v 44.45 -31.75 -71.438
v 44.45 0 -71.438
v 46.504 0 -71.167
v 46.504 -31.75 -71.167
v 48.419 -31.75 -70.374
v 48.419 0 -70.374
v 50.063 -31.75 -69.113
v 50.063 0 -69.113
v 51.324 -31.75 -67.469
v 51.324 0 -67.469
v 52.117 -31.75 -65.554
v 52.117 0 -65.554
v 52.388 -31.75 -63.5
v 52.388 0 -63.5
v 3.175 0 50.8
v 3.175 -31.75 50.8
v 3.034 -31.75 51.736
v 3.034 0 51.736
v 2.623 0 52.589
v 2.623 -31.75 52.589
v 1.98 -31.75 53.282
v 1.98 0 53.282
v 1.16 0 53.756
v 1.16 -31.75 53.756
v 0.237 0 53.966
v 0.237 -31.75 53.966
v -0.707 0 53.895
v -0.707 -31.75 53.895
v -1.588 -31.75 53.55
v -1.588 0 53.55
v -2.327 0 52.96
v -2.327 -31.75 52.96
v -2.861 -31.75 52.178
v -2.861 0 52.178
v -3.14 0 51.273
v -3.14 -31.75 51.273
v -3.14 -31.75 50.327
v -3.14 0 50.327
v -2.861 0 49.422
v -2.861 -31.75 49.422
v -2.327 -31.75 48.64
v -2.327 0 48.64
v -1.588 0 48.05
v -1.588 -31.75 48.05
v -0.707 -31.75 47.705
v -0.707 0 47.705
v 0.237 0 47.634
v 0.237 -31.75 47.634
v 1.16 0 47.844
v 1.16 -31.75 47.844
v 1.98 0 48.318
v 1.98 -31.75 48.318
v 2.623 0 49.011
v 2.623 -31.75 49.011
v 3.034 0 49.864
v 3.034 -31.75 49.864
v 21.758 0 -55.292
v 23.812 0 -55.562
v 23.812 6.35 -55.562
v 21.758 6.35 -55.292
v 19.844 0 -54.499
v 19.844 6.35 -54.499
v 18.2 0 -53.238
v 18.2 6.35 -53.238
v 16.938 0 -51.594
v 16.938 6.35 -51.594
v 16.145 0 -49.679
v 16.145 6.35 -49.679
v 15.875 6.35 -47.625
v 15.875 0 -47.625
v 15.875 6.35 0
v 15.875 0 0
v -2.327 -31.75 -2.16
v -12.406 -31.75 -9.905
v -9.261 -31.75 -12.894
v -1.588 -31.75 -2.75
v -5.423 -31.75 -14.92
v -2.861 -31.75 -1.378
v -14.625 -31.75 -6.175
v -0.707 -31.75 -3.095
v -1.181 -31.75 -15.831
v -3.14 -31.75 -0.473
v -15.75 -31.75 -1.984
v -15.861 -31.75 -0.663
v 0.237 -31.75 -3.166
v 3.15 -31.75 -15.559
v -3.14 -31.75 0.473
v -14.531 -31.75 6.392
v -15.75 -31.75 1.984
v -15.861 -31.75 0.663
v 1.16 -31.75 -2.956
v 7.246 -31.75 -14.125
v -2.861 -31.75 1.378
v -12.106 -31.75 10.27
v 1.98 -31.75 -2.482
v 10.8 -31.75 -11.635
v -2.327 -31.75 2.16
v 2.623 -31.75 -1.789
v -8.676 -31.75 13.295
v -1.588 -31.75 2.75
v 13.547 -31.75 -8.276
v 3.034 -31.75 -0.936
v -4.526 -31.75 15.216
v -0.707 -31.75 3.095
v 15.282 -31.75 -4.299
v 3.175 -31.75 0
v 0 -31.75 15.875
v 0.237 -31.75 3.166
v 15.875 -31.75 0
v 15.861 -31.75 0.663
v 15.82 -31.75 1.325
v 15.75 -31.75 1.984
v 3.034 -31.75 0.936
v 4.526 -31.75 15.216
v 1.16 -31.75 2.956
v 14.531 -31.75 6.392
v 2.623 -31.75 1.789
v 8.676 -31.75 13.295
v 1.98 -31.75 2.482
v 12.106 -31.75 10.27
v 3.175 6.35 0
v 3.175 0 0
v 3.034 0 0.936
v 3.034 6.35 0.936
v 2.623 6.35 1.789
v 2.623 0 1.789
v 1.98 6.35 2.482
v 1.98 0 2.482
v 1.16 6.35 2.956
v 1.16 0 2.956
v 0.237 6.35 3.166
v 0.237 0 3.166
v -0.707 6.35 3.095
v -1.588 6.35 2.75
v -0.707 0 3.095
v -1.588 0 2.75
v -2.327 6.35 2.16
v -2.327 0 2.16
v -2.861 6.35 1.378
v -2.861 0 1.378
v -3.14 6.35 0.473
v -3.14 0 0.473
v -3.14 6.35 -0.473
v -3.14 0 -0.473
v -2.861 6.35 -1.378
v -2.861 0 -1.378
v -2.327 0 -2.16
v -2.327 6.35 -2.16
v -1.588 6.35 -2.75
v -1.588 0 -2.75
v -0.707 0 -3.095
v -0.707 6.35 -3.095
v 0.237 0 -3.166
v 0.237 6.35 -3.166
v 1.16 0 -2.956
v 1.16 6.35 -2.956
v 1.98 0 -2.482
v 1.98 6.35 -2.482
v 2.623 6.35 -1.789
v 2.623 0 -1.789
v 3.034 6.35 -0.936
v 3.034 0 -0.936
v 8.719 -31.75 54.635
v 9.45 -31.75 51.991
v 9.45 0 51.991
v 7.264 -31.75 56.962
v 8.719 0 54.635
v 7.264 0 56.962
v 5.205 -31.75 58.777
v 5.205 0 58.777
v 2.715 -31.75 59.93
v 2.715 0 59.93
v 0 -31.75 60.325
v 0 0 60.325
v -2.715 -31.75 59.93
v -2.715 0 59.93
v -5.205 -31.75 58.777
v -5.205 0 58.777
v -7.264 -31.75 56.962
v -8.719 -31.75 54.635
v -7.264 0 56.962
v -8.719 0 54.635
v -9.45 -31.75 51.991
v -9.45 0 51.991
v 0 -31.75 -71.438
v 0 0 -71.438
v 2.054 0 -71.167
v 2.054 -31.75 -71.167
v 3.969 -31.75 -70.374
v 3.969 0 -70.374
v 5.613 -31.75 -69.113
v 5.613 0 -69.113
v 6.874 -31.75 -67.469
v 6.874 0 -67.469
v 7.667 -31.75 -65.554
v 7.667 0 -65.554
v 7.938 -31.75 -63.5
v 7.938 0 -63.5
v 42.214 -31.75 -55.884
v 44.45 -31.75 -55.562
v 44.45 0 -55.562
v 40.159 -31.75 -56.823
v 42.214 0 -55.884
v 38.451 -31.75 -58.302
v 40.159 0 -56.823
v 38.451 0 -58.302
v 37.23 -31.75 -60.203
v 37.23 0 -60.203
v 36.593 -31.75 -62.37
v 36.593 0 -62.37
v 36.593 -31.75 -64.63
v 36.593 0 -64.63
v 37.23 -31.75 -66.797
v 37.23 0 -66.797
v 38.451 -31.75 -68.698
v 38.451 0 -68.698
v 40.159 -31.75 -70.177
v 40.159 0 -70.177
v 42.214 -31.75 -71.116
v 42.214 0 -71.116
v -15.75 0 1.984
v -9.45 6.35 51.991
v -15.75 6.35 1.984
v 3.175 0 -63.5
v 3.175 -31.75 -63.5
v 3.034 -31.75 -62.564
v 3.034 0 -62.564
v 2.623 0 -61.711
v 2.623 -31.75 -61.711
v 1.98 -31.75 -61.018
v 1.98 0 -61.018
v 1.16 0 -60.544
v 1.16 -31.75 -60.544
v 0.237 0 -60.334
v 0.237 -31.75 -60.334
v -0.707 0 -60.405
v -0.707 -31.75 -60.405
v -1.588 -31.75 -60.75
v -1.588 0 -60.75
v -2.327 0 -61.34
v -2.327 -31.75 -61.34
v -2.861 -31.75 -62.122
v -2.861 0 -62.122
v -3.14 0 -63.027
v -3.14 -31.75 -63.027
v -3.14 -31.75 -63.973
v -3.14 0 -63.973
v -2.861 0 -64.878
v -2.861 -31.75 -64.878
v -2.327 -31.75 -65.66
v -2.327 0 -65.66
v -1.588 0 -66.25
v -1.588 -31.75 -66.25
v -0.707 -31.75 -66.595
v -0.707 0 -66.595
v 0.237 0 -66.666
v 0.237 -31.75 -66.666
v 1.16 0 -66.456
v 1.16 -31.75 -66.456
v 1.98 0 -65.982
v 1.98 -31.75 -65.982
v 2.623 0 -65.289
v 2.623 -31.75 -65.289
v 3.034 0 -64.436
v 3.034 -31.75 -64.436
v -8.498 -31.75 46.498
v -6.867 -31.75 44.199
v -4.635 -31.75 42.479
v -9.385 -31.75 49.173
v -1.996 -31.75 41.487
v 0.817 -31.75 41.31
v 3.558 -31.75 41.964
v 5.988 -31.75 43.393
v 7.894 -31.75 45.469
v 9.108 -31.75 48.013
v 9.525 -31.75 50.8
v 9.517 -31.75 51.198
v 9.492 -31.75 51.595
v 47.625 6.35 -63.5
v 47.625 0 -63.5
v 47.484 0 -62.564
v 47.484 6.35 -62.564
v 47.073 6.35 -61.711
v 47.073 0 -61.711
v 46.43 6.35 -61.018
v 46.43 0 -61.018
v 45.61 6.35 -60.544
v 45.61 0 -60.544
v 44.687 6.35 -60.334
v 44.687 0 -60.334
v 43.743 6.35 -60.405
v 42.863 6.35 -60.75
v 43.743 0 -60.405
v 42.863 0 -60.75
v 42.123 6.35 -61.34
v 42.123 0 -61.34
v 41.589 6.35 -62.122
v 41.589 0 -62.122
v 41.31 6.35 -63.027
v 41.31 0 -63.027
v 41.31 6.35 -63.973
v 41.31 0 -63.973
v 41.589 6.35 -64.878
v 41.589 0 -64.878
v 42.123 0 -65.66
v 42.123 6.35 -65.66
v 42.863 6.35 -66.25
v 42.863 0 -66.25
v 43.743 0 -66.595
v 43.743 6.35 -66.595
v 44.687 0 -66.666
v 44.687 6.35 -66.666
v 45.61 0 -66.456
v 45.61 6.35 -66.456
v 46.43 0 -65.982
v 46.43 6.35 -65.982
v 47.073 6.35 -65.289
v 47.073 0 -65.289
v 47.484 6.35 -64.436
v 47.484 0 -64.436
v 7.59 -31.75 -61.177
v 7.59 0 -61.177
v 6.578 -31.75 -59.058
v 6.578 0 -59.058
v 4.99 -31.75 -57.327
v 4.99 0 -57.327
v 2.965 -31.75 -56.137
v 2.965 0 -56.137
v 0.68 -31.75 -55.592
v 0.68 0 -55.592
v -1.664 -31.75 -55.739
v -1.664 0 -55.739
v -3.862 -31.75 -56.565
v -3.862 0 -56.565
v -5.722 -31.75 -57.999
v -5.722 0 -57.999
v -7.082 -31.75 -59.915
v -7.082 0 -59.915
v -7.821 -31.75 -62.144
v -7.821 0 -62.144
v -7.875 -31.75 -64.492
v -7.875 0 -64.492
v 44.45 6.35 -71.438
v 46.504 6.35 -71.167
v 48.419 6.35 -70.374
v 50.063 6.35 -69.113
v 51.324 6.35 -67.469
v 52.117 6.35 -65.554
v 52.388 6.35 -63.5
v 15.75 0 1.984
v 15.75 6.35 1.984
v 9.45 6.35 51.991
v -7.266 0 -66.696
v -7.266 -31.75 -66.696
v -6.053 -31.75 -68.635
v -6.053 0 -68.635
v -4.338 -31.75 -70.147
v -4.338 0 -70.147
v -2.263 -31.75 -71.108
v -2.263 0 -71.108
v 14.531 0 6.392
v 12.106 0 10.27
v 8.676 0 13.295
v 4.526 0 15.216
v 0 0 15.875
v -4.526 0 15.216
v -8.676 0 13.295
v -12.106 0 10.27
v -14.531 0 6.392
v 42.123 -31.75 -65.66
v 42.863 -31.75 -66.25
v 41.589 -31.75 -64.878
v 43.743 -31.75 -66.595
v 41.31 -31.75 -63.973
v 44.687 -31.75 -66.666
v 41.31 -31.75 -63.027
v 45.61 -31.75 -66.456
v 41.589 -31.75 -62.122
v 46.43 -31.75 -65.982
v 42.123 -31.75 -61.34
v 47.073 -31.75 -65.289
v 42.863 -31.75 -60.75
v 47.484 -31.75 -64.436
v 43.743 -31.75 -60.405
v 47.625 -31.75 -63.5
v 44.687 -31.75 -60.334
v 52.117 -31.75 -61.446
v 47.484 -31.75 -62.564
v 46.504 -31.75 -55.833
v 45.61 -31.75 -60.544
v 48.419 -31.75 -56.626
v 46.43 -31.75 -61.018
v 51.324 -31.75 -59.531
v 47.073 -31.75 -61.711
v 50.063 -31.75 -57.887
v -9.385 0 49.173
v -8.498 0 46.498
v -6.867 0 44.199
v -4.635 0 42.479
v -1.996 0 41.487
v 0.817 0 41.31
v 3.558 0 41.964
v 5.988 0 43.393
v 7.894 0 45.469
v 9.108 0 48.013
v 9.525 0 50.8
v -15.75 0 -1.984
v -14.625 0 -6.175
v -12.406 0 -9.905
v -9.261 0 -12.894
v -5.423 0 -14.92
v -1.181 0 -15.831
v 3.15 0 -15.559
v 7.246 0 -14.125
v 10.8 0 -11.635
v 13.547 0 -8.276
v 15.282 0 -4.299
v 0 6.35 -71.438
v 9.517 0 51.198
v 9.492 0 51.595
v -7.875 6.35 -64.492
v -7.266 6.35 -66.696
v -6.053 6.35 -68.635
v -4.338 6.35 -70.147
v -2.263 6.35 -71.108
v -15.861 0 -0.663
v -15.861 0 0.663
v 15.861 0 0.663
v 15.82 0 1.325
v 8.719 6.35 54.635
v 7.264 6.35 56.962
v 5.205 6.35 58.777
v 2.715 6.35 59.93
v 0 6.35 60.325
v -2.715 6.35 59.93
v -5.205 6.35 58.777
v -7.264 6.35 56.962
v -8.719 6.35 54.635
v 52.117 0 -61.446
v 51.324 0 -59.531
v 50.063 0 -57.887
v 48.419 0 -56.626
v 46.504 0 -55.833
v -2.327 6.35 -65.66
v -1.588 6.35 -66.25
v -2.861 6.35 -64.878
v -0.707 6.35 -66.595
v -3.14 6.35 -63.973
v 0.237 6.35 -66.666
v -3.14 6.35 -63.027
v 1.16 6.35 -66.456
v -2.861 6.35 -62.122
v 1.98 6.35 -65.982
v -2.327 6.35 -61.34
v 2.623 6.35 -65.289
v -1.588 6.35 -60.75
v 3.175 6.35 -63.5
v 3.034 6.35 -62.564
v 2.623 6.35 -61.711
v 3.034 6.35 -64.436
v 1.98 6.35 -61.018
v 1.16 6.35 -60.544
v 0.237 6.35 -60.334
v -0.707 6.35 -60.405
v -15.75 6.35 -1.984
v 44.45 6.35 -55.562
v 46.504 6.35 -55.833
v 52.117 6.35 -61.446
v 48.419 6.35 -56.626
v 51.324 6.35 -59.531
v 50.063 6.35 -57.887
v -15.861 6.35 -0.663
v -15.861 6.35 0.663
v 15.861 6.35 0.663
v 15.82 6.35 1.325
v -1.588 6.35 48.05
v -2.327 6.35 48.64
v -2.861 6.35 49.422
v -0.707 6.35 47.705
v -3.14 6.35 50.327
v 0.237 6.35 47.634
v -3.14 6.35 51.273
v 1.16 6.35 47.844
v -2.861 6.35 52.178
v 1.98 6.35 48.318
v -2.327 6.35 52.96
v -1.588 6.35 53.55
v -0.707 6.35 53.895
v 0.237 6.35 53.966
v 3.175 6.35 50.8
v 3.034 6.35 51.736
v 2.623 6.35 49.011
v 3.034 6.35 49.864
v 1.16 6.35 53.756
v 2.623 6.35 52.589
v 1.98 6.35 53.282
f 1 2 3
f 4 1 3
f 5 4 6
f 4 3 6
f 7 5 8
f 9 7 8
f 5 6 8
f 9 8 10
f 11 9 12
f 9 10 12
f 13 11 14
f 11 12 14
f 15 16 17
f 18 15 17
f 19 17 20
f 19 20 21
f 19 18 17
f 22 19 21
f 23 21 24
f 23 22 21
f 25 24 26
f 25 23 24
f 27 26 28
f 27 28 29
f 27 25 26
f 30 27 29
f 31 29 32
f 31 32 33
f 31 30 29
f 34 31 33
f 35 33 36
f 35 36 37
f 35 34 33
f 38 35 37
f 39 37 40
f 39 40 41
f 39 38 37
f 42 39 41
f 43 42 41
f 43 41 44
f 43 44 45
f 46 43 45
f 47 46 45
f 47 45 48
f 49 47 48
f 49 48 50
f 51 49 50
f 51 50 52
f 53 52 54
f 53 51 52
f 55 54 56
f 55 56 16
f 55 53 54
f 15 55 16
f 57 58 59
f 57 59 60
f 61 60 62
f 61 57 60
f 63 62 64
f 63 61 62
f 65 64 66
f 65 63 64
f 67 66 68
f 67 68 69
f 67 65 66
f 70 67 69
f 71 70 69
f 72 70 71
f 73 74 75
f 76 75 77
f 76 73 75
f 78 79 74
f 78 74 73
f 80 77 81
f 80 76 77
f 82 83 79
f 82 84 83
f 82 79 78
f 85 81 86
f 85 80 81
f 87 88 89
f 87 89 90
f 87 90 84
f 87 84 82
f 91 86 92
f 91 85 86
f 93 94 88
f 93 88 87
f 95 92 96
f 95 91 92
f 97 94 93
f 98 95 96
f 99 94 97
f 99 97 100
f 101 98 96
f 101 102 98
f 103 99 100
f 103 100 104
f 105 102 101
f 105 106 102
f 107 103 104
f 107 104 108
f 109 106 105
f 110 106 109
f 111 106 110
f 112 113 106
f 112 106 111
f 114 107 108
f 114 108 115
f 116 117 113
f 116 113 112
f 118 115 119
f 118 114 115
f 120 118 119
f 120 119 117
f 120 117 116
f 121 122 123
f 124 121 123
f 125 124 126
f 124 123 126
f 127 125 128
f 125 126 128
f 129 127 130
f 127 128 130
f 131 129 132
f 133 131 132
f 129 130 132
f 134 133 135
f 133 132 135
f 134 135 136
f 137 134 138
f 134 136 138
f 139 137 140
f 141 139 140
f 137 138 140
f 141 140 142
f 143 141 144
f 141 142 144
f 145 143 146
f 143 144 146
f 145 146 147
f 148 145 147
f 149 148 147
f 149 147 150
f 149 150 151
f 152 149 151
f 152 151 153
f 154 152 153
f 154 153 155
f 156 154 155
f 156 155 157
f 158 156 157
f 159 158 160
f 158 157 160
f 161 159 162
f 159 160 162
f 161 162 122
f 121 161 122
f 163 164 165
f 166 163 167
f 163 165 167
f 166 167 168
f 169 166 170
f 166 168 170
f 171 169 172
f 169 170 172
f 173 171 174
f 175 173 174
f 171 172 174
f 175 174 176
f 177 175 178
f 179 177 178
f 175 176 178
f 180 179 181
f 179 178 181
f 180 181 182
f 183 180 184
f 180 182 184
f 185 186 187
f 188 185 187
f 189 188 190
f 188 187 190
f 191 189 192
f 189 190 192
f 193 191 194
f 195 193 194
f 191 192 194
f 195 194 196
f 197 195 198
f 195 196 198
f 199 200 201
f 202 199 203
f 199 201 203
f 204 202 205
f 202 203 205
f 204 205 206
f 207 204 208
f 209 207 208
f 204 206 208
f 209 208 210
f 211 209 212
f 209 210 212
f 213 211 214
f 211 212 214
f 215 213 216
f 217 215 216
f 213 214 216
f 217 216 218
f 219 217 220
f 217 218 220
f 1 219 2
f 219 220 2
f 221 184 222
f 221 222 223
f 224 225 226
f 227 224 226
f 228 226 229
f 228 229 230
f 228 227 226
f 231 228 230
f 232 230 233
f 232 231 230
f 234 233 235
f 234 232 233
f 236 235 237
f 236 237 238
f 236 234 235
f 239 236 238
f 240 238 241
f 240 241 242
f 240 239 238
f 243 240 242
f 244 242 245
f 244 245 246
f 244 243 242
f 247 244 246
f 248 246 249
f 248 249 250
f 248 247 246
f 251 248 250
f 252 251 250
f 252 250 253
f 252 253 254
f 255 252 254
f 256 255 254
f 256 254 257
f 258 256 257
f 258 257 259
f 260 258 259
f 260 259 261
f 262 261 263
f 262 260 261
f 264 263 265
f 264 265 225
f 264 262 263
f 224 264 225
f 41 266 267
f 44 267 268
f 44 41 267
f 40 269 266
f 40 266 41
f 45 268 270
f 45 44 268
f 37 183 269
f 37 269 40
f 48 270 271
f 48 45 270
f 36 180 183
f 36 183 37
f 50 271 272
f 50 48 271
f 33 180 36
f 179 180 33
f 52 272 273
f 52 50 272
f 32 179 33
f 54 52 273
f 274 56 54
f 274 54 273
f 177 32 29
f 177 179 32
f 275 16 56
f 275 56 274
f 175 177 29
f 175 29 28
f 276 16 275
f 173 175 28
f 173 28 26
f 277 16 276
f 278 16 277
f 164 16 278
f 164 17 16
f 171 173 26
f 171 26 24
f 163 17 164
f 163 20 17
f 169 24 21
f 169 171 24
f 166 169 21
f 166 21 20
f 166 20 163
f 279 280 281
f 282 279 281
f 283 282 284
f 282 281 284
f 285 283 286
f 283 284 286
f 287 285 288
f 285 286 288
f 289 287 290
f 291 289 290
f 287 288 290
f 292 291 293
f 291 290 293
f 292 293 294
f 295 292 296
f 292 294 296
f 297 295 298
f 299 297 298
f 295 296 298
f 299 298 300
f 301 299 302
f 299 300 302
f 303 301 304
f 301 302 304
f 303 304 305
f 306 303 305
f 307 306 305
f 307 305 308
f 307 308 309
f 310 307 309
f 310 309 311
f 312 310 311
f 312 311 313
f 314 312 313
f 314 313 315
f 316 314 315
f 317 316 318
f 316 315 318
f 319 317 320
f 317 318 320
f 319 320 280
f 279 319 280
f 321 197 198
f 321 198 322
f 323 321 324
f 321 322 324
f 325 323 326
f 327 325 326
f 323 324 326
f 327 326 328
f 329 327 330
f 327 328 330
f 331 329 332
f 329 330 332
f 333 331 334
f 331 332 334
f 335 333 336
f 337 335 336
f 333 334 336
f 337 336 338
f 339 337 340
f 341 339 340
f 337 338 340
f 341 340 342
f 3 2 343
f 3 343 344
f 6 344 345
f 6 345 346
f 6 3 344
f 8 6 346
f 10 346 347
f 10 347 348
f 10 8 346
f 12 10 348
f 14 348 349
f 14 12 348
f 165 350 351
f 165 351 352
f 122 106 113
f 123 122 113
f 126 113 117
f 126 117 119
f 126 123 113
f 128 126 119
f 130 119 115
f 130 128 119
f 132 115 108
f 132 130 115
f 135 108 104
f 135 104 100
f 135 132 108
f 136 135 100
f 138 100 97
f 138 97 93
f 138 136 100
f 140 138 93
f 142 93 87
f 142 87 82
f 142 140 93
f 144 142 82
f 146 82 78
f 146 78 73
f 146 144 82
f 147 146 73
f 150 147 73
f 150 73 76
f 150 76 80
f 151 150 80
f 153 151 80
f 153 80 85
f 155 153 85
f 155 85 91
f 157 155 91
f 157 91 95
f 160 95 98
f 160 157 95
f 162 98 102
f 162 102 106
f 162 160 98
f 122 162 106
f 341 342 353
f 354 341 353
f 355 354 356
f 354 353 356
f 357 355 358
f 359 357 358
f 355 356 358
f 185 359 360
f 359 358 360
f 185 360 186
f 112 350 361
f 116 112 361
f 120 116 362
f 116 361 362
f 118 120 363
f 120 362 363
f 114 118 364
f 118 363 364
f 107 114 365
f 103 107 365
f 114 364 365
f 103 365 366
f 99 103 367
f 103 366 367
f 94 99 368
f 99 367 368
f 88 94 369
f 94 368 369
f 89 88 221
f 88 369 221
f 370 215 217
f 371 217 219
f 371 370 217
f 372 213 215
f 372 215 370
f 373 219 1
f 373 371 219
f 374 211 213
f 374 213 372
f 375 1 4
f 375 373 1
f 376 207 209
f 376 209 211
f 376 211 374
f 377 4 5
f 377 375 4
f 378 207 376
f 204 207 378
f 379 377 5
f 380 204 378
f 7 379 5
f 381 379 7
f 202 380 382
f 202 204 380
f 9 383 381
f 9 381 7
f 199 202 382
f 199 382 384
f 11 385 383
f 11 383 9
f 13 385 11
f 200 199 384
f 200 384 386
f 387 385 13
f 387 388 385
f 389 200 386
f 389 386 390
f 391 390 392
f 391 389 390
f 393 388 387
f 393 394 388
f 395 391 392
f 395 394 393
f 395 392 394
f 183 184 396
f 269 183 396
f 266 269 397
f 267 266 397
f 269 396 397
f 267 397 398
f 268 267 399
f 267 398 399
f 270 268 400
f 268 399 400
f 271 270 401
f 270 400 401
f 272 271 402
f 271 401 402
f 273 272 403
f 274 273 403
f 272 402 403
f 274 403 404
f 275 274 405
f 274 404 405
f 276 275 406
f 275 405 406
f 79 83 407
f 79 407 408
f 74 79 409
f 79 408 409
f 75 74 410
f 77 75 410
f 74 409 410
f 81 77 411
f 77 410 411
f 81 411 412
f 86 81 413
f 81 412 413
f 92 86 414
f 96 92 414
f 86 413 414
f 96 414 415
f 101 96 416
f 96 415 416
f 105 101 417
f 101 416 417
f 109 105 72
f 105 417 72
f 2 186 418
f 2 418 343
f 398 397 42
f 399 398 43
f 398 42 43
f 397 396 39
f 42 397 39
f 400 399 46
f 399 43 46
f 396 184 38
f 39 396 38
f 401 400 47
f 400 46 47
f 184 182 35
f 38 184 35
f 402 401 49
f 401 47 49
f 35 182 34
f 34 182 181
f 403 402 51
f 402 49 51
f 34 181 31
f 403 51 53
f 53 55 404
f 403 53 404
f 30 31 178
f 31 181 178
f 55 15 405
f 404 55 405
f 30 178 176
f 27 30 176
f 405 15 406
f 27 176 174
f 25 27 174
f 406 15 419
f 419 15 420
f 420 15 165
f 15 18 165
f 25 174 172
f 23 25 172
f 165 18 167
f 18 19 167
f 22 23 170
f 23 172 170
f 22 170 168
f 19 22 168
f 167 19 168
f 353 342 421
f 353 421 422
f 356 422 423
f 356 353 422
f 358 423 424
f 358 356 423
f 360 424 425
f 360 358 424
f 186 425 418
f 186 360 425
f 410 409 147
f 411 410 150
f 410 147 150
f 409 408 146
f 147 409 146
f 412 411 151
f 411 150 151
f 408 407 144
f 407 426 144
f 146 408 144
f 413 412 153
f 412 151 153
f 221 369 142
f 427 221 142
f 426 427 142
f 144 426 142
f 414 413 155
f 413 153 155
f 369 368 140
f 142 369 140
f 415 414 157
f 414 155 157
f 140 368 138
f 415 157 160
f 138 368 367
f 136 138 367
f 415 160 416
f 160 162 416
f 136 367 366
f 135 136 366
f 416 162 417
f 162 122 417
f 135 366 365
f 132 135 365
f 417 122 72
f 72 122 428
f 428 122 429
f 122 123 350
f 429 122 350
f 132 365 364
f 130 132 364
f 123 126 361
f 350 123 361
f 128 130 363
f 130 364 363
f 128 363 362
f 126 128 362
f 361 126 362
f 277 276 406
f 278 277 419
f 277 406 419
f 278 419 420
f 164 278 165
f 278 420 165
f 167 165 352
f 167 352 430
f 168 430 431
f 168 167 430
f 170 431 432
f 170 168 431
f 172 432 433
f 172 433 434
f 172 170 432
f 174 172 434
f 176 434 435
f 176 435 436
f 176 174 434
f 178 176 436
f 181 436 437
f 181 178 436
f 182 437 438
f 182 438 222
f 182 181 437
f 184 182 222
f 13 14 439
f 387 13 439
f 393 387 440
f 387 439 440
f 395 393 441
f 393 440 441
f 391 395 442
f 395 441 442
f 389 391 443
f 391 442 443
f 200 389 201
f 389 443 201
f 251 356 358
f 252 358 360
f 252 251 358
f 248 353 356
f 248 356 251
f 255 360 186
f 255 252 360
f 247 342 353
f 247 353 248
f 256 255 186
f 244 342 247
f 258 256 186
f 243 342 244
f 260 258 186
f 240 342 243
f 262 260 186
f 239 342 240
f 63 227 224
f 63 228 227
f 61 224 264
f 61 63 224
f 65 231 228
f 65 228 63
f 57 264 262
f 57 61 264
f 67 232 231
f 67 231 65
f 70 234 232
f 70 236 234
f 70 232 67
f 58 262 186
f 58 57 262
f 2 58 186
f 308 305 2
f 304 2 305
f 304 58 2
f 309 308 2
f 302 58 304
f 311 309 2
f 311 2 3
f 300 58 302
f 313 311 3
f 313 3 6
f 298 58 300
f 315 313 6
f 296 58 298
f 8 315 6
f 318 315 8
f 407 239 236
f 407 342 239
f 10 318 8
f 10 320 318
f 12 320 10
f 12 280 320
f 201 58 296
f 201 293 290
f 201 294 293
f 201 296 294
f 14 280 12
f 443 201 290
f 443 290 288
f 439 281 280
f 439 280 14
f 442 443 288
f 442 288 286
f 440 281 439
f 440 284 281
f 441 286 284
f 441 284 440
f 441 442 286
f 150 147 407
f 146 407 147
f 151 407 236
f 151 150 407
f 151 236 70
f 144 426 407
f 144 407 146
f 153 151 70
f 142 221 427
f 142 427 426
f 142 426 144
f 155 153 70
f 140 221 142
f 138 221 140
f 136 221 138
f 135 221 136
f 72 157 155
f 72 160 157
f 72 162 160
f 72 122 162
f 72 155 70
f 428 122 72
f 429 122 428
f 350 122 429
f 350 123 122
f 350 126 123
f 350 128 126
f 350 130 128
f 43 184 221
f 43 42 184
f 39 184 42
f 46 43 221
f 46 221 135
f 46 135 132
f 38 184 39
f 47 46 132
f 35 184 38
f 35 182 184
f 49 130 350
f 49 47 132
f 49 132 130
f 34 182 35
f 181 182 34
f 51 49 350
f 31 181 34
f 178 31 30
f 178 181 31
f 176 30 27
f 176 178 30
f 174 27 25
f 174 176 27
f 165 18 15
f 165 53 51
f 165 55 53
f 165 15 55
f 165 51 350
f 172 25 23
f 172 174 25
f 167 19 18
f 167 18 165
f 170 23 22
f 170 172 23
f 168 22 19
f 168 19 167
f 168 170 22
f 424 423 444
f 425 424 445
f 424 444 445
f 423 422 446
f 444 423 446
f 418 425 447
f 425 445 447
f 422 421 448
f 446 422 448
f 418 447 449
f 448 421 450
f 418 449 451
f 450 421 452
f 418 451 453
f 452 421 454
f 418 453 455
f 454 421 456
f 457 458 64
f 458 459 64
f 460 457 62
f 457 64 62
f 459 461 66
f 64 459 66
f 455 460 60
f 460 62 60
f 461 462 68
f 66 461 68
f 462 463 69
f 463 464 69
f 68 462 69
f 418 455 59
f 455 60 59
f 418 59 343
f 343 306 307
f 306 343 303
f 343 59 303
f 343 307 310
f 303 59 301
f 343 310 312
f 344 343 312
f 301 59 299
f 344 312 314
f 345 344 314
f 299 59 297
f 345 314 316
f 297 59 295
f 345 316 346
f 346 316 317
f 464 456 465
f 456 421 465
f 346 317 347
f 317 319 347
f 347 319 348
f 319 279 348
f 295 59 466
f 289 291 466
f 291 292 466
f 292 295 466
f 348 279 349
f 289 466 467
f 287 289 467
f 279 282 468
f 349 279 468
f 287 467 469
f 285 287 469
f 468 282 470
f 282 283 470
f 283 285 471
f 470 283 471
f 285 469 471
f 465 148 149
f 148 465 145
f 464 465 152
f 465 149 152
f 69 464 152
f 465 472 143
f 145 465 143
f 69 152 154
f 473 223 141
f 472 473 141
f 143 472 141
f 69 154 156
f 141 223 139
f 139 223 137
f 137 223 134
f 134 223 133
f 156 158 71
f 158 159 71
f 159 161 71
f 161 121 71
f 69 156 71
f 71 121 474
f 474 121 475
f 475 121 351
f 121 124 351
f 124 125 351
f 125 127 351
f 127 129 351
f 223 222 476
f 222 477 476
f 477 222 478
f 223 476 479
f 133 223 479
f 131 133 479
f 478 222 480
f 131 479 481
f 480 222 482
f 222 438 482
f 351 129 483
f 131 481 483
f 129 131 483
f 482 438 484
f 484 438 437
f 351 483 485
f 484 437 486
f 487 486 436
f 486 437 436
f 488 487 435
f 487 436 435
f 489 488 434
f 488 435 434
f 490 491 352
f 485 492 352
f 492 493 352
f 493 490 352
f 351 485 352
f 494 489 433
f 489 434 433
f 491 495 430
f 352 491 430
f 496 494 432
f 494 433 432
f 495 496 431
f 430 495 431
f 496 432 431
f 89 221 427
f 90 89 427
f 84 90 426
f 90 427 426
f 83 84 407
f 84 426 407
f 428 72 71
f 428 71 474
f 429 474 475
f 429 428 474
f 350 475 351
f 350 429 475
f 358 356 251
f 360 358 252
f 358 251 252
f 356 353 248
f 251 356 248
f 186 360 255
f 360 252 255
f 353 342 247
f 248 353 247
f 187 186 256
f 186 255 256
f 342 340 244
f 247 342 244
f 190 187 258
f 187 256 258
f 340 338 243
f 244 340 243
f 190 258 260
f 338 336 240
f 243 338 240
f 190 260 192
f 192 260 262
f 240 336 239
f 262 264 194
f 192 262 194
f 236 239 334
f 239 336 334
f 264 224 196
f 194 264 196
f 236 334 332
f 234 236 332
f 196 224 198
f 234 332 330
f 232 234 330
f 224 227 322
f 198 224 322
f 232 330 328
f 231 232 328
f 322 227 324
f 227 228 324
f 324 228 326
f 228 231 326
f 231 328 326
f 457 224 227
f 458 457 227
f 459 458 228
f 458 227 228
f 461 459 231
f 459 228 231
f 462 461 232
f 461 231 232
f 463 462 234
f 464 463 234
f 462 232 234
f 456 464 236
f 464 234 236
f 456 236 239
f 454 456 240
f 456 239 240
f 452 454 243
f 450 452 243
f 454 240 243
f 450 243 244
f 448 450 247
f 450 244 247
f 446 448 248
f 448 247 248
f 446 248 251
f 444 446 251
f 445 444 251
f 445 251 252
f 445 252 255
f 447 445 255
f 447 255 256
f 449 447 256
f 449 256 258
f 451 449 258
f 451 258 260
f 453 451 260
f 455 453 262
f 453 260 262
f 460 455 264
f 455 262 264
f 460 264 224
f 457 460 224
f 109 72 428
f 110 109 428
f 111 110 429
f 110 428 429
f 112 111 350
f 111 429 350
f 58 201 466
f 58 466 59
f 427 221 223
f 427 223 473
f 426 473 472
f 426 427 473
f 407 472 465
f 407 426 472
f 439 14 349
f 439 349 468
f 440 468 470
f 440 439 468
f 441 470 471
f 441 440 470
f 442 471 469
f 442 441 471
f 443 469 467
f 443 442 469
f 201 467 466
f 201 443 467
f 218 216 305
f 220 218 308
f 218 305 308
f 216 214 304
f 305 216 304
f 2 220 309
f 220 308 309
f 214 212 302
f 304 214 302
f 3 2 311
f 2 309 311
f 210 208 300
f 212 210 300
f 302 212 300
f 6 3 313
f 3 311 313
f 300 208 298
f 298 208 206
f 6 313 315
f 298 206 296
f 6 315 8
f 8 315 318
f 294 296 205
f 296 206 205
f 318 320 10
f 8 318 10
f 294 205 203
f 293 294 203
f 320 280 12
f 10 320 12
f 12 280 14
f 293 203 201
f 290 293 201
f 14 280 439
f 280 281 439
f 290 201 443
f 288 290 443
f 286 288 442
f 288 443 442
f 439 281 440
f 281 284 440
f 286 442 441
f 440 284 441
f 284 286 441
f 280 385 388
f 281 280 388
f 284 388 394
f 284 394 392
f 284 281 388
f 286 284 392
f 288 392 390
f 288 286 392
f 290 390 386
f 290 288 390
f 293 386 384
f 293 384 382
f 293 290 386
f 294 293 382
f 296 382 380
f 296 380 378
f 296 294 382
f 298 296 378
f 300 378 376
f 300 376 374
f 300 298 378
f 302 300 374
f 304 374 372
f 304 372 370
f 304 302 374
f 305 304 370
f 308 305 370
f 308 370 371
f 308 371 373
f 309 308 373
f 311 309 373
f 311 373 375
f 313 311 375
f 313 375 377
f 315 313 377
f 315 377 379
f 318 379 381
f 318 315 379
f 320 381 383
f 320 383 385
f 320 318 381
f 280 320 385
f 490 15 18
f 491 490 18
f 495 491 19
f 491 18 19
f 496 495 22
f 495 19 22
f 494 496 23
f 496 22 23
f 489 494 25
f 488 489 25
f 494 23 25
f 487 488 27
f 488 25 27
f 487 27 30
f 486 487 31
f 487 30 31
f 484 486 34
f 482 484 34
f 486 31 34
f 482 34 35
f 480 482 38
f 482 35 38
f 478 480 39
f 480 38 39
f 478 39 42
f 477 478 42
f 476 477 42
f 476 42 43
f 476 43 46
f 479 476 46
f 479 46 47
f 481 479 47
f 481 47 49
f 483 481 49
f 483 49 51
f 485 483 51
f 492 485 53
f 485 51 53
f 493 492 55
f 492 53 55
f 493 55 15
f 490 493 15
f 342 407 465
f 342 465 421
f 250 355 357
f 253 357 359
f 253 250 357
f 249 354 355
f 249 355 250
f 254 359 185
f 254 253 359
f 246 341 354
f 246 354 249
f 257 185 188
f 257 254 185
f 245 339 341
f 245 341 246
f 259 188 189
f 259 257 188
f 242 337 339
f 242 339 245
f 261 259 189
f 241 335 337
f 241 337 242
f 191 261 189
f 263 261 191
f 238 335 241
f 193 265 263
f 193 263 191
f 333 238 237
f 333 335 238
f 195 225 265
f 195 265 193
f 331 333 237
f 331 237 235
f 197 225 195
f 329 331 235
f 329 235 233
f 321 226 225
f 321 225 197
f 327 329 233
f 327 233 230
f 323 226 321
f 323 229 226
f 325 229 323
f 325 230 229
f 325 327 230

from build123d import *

# Parameters (mm, degrees)
F0_R     = 3.175
F1_DEPTH = 31.75
F2_DEPTH = 6.35


with BuildPart() as f1:
    # F0 (on Front) → F1 (new body)
    with BuildSketch(Plane.XZ):
        with BuildLine():
            ThreePointArc((9.525, 50.8), (9.506305, 51.396483), (9.450293, 51.990625))
            ThreePointArc((9.450293, 51.990625), (0, 60.325), (-9.450293, 51.990625))
            ThreePointArc((-9.450293, 51.990625), (-0.596483, 41.293695), (9.525, 50.8))
        make_face()
        with Locations((0, 50.8)):
            Circle(F0_R, mode=Mode.SUBTRACT)
        with BuildLine():
            ThreePointArc((7.9375, -63.5), (-0.497069, -55.578079), (-7.875244, -64.492187))
            ThreePointArc((-7.875244, -64.492187), (-5.250163, -69.453125), (0, -71.4375))
            ThreePointArc((0, -71.4375), (5.61266, -69.11266), (7.9375, -63.5))
        make_face()
        with Locations((0, -63.5)):
            Circle(F0_R, mode=Mode.SUBTRACT)
        with BuildLine():
            ThreePointArc((52.3875, -63.5), (50.06266, -57.88734), (44.45, -55.5625))
            ThreePointArc((44.45, -55.5625), (36.5125, -63.5), (44.45, -71.4375))
            ThreePointArc((44.45, -71.4375), (50.06266, -69.11266), (52.3875, -63.5))
        make_face()
        with Locations((44.45, -63.5)):
            Circle(F0_R, mode=Mode.SUBTRACT)
        with BuildLine():
            ThreePointArc((-15.750488, -1.984375), (0.994139, -15.843841), (15.875, 0))
            ThreePointArc((15.875, 0), (15.843841, 0.994139), (15.750488, 1.984375))
            ThreePointArc((15.750488, 1.984375), (0, 15.875), (-15.750488, 1.984375))
            ThreePointArc((-15.750488, 1.984375), (-15.875, 0), (-15.750488, -1.984375))
        make_face()
        Circle(F0_R, mode=Mode.SUBTRACT)
    extrude(amount=F1_DEPTH)


with BuildPart() as f2:
    # F0 (on Front) → F2 (new body)
    with BuildSketch(Plane.XZ):
        with BuildLine():
            ThreePointArc((9.525, 50.8), (9.506305, 51.396483), (9.450293, 51.990625))
            ThreePointArc((9.450293, 51.990625), (0, 60.325), (-9.450293, 51.990625))
            ThreePointArc((-9.450293, 51.990625), (-0.596483, 41.293695), (9.525, 50.8))
        make_face()
        with Locations((0, 50.8)):
            Circle(F0_R, mode=Mode.SUBTRACT)
        with BuildLine():
            ThreePointArc((-15.750488, 1.984375), (0, 15.875), (15.750488, 1.984375))
            Line((15.750488, 1.984375), (9.450293, 51.990625))
            ThreePointArc((9.450293, 51.990625), (9.506305, 51.396483), (9.525, 50.8))
            ThreePointArc((9.525, 50.8), (-0.596483, 41.293695), (-9.450293, 51.990625))
            Line((-9.450293, 51.990625), (-15.750488, 1.984375))
        make_face()
        with BuildLine():
            ThreePointArc((-15.750488, -1.984375), (0.994139, -15.843841), (15.875, 0))
            ThreePointArc((15.875, 0), (15.843841, 0.994139), (15.750488, 1.984375))
            ThreePointArc((15.750488, 1.984375), (0, 15.875), (-15.750488, 1.984375))
            ThreePointArc((-15.750488, 1.984375), (-15.875, 0), (-15.750488, -1.984375))
        make_face()
        Circle(F0_R, mode=Mode.SUBTRACT)
        with BuildLine():
            Line((15.875, -47.625), (15.875, 0))
            ThreePointArc((15.875, 0), (0.994139, -15.843841), (-15.750488, -1.984375))
            Line((-15.750488, -1.984375), (-7.875244, -64.492187))
            ThreePointArc((-7.875244, -64.492187), (-0.497069, -55.578079), (7.9375, -63.5))
            ThreePointArc((7.9375, -63.5), (5.61266, -69.11266), (0, -71.4375))
            Line((0, -71.4375), (44.45, -71.4375))
            ThreePointArc((44.45, -71.4375), (36.5125, -63.5), (44.45, -55.5625))
            Line((44.45, -55.5625), (23.8125, -55.5625))
            ThreePointArc((23.8125, -55.5625), (18.19984, -53.23766), (15.875, -47.625))
        make_face()
        with BuildLine():
            ThreePointArc((7.9375, -63.5), (-0.497069, -55.578079), (-7.875244, -64.492187))
            ThreePointArc((-7.875244, -64.492187), (-5.250163, -69.453125), (0, -71.4375))
            ThreePointArc((0, -71.4375), (5.61266, -69.11266), (7.9375, -63.5))
        make_face()
        with Locations((0, -63.5)):
            Circle(F0_R, mode=Mode.SUBTRACT)
        with BuildLine():
            ThreePointArc((52.3875, -63.5), (50.06266, -57.88734), (44.45, -55.5625))
            ThreePointArc((44.45, -55.5625), (36.5125, -63.5), (44.45, -71.4375))
            ThreePointArc((44.45, -71.4375), (50.06266, -69.11266), (52.3875, -63.5))
        make_face()
        with Locations((44.45, -63.5)):
            Circle(F0_R, mode=Mode.SUBTRACT)
    extrude(amount=-F2_DEPTH)


solid = Compound([f1.part, f2.part])
